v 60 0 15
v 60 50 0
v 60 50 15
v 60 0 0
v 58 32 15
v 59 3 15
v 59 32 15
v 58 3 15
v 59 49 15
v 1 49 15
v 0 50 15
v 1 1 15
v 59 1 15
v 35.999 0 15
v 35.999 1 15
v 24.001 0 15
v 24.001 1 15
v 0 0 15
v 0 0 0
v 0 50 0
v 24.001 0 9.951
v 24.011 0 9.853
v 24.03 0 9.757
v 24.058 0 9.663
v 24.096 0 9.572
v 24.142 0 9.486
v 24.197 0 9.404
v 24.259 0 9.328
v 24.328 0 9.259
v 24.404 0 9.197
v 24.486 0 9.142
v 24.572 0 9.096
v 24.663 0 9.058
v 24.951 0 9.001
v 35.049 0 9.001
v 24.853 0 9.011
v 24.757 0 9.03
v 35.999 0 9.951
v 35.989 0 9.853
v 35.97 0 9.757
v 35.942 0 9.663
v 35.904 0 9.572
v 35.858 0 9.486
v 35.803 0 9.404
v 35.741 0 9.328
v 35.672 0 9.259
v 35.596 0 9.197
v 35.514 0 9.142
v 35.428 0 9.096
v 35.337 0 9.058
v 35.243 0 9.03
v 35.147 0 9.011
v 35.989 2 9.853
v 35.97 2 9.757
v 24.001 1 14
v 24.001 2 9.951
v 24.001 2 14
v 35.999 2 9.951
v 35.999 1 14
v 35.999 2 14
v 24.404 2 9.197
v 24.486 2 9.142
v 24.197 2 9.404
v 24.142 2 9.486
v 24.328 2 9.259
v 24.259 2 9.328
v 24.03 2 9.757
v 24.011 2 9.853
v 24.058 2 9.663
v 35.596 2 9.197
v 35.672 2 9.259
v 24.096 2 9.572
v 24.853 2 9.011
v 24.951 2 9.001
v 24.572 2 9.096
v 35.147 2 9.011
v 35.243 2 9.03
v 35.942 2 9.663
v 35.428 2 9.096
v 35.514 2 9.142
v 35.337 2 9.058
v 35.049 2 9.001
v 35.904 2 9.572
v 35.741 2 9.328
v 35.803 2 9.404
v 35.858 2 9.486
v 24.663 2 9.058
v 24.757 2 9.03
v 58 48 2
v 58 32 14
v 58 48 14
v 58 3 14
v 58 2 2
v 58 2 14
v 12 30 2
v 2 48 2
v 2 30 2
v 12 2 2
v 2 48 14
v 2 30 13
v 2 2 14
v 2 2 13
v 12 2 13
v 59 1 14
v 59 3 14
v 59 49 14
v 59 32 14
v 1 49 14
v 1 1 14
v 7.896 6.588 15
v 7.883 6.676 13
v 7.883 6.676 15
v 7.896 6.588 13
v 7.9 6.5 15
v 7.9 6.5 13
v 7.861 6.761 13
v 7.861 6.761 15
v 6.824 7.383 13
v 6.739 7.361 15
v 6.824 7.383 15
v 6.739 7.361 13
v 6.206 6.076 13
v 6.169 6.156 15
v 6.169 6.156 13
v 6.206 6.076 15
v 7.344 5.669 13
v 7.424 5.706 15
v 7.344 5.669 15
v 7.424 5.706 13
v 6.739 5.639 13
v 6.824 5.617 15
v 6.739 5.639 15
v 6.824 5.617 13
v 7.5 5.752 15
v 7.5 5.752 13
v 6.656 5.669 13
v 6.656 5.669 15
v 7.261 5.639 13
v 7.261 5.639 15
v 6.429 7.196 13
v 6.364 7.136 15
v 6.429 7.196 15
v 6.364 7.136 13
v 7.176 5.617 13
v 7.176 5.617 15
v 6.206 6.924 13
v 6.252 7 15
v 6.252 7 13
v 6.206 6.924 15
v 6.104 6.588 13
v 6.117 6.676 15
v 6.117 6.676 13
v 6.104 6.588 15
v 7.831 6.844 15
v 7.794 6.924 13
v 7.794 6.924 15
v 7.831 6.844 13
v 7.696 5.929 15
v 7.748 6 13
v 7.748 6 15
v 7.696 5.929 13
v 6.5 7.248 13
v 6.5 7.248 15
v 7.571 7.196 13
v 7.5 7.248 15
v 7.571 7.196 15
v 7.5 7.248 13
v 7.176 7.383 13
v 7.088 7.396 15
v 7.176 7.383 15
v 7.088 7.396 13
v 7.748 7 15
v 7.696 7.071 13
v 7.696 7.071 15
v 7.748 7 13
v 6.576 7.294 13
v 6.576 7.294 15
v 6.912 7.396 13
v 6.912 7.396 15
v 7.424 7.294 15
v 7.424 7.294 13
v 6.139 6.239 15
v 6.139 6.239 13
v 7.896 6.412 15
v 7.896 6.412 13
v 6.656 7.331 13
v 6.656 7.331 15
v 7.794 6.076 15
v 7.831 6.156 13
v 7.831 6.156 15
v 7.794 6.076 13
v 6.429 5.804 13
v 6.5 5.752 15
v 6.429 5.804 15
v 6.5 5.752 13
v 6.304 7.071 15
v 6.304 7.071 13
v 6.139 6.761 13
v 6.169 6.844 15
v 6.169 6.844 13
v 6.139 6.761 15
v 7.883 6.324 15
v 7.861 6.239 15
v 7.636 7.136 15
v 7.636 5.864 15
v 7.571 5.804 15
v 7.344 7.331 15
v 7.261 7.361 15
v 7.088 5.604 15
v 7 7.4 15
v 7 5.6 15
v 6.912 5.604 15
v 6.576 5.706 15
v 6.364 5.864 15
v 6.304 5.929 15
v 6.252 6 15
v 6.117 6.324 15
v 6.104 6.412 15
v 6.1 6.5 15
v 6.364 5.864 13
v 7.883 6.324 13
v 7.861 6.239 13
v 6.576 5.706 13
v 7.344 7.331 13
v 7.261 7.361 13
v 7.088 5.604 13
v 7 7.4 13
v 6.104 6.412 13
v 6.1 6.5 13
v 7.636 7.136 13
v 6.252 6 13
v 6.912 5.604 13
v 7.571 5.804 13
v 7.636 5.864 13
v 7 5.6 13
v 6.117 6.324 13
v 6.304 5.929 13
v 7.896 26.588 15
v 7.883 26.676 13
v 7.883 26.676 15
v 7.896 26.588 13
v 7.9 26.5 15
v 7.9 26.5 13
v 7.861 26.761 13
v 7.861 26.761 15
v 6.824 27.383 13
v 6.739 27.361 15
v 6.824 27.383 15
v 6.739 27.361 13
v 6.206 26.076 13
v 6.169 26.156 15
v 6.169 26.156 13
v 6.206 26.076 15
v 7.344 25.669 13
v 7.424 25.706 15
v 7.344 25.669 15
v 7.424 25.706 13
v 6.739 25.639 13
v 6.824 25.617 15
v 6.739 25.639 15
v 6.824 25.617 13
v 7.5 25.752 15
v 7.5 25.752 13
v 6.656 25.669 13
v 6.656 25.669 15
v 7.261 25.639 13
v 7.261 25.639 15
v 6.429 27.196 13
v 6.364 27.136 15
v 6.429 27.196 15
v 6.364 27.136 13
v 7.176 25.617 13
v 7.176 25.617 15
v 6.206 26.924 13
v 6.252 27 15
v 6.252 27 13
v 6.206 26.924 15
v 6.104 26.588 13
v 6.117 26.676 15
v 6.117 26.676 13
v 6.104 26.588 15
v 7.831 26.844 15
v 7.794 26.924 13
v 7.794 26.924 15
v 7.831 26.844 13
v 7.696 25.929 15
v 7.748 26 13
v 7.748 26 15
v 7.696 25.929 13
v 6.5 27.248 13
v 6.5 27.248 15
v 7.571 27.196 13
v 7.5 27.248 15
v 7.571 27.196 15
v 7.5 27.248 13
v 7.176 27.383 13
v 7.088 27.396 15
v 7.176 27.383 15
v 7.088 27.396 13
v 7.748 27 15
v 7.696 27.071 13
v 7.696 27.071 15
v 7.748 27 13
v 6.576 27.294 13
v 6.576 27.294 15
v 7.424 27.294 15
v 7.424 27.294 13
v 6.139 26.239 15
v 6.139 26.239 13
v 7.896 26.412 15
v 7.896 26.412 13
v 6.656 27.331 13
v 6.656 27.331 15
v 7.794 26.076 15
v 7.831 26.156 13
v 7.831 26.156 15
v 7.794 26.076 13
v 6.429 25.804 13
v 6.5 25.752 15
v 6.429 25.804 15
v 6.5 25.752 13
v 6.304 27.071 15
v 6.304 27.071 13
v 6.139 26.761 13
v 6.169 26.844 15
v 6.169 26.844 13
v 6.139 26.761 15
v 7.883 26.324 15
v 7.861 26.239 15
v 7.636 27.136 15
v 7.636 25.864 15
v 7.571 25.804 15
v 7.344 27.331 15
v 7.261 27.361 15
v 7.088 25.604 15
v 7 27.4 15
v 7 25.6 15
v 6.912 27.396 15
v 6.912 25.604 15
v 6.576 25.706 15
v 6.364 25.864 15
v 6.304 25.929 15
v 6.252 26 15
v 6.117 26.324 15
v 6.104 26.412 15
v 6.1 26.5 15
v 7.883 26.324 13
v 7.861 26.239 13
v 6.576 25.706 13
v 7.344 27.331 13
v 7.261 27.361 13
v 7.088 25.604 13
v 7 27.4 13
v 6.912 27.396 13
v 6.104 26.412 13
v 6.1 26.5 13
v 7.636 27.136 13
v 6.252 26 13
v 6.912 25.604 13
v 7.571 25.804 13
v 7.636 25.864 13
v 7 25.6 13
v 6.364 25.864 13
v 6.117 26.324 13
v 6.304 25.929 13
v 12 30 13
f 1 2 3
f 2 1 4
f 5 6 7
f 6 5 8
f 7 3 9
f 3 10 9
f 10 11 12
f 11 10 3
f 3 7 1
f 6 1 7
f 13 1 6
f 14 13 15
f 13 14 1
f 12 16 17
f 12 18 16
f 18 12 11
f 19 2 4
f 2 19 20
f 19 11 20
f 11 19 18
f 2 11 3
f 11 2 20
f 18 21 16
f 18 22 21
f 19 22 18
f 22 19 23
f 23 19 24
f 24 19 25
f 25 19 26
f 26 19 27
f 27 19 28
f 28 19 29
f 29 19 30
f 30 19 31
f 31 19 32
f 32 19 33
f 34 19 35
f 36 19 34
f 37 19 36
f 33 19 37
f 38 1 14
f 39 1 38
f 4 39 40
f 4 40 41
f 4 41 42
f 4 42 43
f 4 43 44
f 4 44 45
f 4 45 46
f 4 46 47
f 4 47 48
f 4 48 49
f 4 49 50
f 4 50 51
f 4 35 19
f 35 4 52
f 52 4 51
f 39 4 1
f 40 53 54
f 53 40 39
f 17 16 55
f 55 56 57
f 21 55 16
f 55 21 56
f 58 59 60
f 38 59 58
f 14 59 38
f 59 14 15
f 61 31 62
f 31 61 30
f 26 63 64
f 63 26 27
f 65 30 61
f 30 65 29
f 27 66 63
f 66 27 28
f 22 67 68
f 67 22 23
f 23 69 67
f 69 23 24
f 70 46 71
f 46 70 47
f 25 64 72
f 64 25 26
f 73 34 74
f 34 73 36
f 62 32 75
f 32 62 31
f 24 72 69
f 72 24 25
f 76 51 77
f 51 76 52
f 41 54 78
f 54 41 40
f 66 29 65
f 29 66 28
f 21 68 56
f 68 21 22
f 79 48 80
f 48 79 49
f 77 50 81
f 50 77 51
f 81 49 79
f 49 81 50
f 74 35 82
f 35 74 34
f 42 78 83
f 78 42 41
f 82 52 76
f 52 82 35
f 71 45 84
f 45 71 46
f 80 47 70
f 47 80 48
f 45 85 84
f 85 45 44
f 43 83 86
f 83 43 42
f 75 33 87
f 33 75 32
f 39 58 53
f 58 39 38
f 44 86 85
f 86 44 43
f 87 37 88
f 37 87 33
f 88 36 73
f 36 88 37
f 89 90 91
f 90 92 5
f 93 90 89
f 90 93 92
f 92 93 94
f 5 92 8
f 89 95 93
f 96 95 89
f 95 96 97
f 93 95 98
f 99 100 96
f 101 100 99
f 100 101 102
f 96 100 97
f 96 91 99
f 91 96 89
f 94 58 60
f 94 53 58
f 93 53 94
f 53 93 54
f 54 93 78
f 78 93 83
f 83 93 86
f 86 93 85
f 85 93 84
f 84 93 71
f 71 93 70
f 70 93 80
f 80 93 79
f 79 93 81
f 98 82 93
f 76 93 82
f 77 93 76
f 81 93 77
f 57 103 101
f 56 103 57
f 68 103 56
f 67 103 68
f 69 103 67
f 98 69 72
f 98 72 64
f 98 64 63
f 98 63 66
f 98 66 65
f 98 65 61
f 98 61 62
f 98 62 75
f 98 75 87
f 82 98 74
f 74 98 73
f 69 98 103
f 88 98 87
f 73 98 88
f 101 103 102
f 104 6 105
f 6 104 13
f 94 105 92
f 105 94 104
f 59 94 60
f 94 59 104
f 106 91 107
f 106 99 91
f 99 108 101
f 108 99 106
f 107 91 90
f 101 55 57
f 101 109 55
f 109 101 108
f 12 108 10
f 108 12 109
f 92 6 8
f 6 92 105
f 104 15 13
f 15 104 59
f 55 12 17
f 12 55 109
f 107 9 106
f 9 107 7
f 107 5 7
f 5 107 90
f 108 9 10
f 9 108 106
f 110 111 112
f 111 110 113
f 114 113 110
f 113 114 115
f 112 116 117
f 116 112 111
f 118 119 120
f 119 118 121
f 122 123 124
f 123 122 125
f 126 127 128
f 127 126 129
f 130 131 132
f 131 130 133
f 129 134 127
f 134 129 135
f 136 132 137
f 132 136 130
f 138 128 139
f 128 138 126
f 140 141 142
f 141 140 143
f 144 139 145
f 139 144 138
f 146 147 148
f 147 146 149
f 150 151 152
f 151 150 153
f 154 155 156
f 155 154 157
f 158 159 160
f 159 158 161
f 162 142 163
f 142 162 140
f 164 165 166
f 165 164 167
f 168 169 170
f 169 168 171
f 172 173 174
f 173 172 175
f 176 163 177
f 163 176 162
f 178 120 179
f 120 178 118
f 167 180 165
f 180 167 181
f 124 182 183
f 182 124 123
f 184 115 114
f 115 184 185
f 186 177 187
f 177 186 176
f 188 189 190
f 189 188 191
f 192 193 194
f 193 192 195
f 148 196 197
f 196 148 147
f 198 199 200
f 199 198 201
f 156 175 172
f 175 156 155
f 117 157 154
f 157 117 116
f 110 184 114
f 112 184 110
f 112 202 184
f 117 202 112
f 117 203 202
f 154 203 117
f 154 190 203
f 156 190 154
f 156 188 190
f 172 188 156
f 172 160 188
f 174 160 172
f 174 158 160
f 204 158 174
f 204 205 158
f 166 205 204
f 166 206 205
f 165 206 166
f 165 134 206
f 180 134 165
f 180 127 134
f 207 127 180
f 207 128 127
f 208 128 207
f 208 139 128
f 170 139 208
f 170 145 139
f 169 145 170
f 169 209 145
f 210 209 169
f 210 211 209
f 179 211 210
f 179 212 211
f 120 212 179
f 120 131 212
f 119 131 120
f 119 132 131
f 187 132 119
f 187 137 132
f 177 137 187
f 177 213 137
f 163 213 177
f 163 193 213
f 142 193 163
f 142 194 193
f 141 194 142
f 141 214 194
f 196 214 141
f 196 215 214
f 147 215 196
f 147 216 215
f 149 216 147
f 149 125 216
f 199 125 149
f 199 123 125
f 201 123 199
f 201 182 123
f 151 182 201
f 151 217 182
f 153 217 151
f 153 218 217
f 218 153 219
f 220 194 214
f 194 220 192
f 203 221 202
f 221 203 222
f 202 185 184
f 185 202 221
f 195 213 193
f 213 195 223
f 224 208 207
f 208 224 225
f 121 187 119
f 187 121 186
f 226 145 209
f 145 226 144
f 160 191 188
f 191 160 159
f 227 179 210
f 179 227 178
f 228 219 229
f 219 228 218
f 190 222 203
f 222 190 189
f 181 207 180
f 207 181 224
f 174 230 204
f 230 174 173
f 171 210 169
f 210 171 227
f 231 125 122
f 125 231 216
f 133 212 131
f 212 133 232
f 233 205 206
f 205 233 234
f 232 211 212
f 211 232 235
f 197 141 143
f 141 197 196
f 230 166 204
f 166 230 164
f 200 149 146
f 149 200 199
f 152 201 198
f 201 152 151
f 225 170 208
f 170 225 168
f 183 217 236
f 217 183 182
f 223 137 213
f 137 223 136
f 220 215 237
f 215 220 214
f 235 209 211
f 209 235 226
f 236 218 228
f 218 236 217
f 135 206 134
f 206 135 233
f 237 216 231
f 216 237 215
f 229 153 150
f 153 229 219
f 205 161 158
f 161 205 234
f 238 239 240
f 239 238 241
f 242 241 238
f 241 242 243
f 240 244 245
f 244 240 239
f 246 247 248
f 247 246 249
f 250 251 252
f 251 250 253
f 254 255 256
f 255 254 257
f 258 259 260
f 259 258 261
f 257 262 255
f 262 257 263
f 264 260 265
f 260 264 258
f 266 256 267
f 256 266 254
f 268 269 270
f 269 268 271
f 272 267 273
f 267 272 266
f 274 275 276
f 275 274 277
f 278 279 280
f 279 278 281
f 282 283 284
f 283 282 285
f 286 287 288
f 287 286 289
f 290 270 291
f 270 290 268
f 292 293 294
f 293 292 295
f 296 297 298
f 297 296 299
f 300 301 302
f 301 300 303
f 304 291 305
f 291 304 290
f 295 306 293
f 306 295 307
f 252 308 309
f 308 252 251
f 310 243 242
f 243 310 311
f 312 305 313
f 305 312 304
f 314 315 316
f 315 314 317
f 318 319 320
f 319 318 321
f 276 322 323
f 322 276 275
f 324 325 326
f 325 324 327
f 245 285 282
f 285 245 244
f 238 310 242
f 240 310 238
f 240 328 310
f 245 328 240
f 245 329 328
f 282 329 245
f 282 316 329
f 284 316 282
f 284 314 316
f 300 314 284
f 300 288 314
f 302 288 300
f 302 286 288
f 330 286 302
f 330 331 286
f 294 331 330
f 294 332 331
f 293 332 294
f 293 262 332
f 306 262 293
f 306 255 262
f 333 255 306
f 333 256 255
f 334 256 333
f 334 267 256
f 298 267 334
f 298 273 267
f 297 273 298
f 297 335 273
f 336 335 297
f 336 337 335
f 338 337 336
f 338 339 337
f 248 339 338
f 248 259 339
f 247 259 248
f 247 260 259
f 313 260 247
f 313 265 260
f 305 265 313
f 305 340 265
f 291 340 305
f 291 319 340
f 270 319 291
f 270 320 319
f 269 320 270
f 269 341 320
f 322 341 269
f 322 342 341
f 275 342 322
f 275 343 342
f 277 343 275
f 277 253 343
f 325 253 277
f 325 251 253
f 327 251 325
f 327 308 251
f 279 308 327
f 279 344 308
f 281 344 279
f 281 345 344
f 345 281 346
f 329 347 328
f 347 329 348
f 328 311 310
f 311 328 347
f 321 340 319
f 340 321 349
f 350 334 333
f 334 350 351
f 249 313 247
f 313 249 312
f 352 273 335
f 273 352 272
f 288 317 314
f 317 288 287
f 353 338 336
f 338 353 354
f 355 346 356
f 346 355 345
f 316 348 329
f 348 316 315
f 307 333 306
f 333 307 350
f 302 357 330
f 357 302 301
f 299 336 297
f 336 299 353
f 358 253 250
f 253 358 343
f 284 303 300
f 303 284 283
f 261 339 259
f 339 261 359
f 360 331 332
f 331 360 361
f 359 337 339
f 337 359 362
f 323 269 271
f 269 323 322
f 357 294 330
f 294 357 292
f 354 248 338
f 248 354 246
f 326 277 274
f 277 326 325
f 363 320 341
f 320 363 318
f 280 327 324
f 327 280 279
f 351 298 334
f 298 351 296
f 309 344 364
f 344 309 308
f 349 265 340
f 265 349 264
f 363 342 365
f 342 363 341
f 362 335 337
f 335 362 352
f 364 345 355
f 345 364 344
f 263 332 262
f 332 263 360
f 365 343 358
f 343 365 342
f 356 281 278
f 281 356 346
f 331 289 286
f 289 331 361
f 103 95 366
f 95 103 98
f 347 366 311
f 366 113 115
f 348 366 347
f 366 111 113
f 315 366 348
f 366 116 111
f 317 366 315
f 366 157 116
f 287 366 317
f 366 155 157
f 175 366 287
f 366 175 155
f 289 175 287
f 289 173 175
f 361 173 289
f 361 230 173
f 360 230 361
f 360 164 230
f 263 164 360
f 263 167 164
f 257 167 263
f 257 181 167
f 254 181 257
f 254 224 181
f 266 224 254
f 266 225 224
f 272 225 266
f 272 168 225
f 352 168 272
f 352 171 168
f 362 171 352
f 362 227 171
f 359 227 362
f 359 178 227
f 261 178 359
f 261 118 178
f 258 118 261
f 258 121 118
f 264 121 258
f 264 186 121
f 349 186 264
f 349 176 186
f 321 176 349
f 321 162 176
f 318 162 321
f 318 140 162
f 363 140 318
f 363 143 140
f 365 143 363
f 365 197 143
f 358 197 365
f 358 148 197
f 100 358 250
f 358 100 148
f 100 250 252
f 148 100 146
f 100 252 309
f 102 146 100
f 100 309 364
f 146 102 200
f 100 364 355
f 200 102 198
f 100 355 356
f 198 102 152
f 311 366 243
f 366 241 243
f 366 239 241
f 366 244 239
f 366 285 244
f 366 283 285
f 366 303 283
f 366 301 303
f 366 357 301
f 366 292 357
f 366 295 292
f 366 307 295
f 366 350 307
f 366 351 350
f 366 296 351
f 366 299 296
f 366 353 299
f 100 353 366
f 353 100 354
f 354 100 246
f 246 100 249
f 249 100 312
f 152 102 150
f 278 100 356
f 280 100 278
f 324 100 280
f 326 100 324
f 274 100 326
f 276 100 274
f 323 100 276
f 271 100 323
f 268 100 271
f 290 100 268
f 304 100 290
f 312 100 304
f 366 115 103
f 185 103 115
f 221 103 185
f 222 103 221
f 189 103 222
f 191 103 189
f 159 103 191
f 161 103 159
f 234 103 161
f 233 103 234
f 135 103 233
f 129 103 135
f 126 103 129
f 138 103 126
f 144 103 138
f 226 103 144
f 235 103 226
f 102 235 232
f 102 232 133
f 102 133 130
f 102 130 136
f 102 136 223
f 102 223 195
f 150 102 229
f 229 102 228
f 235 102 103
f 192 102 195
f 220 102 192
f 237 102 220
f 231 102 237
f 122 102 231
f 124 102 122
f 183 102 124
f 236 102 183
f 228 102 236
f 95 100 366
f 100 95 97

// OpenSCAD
$fn = 64;
union() {
	difference() {
		cube([60, 50, 15]);
		translate([25, 0, 10]) minkowski() {
			cube([10, 2, 5]);
			sphere(1);
		}
		translate([2, 2, 2]) cube([56, 46, 20]);
		translate([1, 1, 14]) cube([58, 2, 2]);
		translate([57, 32, 14]) cube([2, 16, 2]);
		translate([1, 47, 14]) cube([58, 2, 2]);
		translate([1, 1, 14]) cube([2, 48, 2]);
	}
	translate([7, 6.5, 0]) cylinder(15, .9, .9);
	translate([7, 26.5, 0]) cylinder(15, .9, .9);
	cube([12, 30, 13]);
}
